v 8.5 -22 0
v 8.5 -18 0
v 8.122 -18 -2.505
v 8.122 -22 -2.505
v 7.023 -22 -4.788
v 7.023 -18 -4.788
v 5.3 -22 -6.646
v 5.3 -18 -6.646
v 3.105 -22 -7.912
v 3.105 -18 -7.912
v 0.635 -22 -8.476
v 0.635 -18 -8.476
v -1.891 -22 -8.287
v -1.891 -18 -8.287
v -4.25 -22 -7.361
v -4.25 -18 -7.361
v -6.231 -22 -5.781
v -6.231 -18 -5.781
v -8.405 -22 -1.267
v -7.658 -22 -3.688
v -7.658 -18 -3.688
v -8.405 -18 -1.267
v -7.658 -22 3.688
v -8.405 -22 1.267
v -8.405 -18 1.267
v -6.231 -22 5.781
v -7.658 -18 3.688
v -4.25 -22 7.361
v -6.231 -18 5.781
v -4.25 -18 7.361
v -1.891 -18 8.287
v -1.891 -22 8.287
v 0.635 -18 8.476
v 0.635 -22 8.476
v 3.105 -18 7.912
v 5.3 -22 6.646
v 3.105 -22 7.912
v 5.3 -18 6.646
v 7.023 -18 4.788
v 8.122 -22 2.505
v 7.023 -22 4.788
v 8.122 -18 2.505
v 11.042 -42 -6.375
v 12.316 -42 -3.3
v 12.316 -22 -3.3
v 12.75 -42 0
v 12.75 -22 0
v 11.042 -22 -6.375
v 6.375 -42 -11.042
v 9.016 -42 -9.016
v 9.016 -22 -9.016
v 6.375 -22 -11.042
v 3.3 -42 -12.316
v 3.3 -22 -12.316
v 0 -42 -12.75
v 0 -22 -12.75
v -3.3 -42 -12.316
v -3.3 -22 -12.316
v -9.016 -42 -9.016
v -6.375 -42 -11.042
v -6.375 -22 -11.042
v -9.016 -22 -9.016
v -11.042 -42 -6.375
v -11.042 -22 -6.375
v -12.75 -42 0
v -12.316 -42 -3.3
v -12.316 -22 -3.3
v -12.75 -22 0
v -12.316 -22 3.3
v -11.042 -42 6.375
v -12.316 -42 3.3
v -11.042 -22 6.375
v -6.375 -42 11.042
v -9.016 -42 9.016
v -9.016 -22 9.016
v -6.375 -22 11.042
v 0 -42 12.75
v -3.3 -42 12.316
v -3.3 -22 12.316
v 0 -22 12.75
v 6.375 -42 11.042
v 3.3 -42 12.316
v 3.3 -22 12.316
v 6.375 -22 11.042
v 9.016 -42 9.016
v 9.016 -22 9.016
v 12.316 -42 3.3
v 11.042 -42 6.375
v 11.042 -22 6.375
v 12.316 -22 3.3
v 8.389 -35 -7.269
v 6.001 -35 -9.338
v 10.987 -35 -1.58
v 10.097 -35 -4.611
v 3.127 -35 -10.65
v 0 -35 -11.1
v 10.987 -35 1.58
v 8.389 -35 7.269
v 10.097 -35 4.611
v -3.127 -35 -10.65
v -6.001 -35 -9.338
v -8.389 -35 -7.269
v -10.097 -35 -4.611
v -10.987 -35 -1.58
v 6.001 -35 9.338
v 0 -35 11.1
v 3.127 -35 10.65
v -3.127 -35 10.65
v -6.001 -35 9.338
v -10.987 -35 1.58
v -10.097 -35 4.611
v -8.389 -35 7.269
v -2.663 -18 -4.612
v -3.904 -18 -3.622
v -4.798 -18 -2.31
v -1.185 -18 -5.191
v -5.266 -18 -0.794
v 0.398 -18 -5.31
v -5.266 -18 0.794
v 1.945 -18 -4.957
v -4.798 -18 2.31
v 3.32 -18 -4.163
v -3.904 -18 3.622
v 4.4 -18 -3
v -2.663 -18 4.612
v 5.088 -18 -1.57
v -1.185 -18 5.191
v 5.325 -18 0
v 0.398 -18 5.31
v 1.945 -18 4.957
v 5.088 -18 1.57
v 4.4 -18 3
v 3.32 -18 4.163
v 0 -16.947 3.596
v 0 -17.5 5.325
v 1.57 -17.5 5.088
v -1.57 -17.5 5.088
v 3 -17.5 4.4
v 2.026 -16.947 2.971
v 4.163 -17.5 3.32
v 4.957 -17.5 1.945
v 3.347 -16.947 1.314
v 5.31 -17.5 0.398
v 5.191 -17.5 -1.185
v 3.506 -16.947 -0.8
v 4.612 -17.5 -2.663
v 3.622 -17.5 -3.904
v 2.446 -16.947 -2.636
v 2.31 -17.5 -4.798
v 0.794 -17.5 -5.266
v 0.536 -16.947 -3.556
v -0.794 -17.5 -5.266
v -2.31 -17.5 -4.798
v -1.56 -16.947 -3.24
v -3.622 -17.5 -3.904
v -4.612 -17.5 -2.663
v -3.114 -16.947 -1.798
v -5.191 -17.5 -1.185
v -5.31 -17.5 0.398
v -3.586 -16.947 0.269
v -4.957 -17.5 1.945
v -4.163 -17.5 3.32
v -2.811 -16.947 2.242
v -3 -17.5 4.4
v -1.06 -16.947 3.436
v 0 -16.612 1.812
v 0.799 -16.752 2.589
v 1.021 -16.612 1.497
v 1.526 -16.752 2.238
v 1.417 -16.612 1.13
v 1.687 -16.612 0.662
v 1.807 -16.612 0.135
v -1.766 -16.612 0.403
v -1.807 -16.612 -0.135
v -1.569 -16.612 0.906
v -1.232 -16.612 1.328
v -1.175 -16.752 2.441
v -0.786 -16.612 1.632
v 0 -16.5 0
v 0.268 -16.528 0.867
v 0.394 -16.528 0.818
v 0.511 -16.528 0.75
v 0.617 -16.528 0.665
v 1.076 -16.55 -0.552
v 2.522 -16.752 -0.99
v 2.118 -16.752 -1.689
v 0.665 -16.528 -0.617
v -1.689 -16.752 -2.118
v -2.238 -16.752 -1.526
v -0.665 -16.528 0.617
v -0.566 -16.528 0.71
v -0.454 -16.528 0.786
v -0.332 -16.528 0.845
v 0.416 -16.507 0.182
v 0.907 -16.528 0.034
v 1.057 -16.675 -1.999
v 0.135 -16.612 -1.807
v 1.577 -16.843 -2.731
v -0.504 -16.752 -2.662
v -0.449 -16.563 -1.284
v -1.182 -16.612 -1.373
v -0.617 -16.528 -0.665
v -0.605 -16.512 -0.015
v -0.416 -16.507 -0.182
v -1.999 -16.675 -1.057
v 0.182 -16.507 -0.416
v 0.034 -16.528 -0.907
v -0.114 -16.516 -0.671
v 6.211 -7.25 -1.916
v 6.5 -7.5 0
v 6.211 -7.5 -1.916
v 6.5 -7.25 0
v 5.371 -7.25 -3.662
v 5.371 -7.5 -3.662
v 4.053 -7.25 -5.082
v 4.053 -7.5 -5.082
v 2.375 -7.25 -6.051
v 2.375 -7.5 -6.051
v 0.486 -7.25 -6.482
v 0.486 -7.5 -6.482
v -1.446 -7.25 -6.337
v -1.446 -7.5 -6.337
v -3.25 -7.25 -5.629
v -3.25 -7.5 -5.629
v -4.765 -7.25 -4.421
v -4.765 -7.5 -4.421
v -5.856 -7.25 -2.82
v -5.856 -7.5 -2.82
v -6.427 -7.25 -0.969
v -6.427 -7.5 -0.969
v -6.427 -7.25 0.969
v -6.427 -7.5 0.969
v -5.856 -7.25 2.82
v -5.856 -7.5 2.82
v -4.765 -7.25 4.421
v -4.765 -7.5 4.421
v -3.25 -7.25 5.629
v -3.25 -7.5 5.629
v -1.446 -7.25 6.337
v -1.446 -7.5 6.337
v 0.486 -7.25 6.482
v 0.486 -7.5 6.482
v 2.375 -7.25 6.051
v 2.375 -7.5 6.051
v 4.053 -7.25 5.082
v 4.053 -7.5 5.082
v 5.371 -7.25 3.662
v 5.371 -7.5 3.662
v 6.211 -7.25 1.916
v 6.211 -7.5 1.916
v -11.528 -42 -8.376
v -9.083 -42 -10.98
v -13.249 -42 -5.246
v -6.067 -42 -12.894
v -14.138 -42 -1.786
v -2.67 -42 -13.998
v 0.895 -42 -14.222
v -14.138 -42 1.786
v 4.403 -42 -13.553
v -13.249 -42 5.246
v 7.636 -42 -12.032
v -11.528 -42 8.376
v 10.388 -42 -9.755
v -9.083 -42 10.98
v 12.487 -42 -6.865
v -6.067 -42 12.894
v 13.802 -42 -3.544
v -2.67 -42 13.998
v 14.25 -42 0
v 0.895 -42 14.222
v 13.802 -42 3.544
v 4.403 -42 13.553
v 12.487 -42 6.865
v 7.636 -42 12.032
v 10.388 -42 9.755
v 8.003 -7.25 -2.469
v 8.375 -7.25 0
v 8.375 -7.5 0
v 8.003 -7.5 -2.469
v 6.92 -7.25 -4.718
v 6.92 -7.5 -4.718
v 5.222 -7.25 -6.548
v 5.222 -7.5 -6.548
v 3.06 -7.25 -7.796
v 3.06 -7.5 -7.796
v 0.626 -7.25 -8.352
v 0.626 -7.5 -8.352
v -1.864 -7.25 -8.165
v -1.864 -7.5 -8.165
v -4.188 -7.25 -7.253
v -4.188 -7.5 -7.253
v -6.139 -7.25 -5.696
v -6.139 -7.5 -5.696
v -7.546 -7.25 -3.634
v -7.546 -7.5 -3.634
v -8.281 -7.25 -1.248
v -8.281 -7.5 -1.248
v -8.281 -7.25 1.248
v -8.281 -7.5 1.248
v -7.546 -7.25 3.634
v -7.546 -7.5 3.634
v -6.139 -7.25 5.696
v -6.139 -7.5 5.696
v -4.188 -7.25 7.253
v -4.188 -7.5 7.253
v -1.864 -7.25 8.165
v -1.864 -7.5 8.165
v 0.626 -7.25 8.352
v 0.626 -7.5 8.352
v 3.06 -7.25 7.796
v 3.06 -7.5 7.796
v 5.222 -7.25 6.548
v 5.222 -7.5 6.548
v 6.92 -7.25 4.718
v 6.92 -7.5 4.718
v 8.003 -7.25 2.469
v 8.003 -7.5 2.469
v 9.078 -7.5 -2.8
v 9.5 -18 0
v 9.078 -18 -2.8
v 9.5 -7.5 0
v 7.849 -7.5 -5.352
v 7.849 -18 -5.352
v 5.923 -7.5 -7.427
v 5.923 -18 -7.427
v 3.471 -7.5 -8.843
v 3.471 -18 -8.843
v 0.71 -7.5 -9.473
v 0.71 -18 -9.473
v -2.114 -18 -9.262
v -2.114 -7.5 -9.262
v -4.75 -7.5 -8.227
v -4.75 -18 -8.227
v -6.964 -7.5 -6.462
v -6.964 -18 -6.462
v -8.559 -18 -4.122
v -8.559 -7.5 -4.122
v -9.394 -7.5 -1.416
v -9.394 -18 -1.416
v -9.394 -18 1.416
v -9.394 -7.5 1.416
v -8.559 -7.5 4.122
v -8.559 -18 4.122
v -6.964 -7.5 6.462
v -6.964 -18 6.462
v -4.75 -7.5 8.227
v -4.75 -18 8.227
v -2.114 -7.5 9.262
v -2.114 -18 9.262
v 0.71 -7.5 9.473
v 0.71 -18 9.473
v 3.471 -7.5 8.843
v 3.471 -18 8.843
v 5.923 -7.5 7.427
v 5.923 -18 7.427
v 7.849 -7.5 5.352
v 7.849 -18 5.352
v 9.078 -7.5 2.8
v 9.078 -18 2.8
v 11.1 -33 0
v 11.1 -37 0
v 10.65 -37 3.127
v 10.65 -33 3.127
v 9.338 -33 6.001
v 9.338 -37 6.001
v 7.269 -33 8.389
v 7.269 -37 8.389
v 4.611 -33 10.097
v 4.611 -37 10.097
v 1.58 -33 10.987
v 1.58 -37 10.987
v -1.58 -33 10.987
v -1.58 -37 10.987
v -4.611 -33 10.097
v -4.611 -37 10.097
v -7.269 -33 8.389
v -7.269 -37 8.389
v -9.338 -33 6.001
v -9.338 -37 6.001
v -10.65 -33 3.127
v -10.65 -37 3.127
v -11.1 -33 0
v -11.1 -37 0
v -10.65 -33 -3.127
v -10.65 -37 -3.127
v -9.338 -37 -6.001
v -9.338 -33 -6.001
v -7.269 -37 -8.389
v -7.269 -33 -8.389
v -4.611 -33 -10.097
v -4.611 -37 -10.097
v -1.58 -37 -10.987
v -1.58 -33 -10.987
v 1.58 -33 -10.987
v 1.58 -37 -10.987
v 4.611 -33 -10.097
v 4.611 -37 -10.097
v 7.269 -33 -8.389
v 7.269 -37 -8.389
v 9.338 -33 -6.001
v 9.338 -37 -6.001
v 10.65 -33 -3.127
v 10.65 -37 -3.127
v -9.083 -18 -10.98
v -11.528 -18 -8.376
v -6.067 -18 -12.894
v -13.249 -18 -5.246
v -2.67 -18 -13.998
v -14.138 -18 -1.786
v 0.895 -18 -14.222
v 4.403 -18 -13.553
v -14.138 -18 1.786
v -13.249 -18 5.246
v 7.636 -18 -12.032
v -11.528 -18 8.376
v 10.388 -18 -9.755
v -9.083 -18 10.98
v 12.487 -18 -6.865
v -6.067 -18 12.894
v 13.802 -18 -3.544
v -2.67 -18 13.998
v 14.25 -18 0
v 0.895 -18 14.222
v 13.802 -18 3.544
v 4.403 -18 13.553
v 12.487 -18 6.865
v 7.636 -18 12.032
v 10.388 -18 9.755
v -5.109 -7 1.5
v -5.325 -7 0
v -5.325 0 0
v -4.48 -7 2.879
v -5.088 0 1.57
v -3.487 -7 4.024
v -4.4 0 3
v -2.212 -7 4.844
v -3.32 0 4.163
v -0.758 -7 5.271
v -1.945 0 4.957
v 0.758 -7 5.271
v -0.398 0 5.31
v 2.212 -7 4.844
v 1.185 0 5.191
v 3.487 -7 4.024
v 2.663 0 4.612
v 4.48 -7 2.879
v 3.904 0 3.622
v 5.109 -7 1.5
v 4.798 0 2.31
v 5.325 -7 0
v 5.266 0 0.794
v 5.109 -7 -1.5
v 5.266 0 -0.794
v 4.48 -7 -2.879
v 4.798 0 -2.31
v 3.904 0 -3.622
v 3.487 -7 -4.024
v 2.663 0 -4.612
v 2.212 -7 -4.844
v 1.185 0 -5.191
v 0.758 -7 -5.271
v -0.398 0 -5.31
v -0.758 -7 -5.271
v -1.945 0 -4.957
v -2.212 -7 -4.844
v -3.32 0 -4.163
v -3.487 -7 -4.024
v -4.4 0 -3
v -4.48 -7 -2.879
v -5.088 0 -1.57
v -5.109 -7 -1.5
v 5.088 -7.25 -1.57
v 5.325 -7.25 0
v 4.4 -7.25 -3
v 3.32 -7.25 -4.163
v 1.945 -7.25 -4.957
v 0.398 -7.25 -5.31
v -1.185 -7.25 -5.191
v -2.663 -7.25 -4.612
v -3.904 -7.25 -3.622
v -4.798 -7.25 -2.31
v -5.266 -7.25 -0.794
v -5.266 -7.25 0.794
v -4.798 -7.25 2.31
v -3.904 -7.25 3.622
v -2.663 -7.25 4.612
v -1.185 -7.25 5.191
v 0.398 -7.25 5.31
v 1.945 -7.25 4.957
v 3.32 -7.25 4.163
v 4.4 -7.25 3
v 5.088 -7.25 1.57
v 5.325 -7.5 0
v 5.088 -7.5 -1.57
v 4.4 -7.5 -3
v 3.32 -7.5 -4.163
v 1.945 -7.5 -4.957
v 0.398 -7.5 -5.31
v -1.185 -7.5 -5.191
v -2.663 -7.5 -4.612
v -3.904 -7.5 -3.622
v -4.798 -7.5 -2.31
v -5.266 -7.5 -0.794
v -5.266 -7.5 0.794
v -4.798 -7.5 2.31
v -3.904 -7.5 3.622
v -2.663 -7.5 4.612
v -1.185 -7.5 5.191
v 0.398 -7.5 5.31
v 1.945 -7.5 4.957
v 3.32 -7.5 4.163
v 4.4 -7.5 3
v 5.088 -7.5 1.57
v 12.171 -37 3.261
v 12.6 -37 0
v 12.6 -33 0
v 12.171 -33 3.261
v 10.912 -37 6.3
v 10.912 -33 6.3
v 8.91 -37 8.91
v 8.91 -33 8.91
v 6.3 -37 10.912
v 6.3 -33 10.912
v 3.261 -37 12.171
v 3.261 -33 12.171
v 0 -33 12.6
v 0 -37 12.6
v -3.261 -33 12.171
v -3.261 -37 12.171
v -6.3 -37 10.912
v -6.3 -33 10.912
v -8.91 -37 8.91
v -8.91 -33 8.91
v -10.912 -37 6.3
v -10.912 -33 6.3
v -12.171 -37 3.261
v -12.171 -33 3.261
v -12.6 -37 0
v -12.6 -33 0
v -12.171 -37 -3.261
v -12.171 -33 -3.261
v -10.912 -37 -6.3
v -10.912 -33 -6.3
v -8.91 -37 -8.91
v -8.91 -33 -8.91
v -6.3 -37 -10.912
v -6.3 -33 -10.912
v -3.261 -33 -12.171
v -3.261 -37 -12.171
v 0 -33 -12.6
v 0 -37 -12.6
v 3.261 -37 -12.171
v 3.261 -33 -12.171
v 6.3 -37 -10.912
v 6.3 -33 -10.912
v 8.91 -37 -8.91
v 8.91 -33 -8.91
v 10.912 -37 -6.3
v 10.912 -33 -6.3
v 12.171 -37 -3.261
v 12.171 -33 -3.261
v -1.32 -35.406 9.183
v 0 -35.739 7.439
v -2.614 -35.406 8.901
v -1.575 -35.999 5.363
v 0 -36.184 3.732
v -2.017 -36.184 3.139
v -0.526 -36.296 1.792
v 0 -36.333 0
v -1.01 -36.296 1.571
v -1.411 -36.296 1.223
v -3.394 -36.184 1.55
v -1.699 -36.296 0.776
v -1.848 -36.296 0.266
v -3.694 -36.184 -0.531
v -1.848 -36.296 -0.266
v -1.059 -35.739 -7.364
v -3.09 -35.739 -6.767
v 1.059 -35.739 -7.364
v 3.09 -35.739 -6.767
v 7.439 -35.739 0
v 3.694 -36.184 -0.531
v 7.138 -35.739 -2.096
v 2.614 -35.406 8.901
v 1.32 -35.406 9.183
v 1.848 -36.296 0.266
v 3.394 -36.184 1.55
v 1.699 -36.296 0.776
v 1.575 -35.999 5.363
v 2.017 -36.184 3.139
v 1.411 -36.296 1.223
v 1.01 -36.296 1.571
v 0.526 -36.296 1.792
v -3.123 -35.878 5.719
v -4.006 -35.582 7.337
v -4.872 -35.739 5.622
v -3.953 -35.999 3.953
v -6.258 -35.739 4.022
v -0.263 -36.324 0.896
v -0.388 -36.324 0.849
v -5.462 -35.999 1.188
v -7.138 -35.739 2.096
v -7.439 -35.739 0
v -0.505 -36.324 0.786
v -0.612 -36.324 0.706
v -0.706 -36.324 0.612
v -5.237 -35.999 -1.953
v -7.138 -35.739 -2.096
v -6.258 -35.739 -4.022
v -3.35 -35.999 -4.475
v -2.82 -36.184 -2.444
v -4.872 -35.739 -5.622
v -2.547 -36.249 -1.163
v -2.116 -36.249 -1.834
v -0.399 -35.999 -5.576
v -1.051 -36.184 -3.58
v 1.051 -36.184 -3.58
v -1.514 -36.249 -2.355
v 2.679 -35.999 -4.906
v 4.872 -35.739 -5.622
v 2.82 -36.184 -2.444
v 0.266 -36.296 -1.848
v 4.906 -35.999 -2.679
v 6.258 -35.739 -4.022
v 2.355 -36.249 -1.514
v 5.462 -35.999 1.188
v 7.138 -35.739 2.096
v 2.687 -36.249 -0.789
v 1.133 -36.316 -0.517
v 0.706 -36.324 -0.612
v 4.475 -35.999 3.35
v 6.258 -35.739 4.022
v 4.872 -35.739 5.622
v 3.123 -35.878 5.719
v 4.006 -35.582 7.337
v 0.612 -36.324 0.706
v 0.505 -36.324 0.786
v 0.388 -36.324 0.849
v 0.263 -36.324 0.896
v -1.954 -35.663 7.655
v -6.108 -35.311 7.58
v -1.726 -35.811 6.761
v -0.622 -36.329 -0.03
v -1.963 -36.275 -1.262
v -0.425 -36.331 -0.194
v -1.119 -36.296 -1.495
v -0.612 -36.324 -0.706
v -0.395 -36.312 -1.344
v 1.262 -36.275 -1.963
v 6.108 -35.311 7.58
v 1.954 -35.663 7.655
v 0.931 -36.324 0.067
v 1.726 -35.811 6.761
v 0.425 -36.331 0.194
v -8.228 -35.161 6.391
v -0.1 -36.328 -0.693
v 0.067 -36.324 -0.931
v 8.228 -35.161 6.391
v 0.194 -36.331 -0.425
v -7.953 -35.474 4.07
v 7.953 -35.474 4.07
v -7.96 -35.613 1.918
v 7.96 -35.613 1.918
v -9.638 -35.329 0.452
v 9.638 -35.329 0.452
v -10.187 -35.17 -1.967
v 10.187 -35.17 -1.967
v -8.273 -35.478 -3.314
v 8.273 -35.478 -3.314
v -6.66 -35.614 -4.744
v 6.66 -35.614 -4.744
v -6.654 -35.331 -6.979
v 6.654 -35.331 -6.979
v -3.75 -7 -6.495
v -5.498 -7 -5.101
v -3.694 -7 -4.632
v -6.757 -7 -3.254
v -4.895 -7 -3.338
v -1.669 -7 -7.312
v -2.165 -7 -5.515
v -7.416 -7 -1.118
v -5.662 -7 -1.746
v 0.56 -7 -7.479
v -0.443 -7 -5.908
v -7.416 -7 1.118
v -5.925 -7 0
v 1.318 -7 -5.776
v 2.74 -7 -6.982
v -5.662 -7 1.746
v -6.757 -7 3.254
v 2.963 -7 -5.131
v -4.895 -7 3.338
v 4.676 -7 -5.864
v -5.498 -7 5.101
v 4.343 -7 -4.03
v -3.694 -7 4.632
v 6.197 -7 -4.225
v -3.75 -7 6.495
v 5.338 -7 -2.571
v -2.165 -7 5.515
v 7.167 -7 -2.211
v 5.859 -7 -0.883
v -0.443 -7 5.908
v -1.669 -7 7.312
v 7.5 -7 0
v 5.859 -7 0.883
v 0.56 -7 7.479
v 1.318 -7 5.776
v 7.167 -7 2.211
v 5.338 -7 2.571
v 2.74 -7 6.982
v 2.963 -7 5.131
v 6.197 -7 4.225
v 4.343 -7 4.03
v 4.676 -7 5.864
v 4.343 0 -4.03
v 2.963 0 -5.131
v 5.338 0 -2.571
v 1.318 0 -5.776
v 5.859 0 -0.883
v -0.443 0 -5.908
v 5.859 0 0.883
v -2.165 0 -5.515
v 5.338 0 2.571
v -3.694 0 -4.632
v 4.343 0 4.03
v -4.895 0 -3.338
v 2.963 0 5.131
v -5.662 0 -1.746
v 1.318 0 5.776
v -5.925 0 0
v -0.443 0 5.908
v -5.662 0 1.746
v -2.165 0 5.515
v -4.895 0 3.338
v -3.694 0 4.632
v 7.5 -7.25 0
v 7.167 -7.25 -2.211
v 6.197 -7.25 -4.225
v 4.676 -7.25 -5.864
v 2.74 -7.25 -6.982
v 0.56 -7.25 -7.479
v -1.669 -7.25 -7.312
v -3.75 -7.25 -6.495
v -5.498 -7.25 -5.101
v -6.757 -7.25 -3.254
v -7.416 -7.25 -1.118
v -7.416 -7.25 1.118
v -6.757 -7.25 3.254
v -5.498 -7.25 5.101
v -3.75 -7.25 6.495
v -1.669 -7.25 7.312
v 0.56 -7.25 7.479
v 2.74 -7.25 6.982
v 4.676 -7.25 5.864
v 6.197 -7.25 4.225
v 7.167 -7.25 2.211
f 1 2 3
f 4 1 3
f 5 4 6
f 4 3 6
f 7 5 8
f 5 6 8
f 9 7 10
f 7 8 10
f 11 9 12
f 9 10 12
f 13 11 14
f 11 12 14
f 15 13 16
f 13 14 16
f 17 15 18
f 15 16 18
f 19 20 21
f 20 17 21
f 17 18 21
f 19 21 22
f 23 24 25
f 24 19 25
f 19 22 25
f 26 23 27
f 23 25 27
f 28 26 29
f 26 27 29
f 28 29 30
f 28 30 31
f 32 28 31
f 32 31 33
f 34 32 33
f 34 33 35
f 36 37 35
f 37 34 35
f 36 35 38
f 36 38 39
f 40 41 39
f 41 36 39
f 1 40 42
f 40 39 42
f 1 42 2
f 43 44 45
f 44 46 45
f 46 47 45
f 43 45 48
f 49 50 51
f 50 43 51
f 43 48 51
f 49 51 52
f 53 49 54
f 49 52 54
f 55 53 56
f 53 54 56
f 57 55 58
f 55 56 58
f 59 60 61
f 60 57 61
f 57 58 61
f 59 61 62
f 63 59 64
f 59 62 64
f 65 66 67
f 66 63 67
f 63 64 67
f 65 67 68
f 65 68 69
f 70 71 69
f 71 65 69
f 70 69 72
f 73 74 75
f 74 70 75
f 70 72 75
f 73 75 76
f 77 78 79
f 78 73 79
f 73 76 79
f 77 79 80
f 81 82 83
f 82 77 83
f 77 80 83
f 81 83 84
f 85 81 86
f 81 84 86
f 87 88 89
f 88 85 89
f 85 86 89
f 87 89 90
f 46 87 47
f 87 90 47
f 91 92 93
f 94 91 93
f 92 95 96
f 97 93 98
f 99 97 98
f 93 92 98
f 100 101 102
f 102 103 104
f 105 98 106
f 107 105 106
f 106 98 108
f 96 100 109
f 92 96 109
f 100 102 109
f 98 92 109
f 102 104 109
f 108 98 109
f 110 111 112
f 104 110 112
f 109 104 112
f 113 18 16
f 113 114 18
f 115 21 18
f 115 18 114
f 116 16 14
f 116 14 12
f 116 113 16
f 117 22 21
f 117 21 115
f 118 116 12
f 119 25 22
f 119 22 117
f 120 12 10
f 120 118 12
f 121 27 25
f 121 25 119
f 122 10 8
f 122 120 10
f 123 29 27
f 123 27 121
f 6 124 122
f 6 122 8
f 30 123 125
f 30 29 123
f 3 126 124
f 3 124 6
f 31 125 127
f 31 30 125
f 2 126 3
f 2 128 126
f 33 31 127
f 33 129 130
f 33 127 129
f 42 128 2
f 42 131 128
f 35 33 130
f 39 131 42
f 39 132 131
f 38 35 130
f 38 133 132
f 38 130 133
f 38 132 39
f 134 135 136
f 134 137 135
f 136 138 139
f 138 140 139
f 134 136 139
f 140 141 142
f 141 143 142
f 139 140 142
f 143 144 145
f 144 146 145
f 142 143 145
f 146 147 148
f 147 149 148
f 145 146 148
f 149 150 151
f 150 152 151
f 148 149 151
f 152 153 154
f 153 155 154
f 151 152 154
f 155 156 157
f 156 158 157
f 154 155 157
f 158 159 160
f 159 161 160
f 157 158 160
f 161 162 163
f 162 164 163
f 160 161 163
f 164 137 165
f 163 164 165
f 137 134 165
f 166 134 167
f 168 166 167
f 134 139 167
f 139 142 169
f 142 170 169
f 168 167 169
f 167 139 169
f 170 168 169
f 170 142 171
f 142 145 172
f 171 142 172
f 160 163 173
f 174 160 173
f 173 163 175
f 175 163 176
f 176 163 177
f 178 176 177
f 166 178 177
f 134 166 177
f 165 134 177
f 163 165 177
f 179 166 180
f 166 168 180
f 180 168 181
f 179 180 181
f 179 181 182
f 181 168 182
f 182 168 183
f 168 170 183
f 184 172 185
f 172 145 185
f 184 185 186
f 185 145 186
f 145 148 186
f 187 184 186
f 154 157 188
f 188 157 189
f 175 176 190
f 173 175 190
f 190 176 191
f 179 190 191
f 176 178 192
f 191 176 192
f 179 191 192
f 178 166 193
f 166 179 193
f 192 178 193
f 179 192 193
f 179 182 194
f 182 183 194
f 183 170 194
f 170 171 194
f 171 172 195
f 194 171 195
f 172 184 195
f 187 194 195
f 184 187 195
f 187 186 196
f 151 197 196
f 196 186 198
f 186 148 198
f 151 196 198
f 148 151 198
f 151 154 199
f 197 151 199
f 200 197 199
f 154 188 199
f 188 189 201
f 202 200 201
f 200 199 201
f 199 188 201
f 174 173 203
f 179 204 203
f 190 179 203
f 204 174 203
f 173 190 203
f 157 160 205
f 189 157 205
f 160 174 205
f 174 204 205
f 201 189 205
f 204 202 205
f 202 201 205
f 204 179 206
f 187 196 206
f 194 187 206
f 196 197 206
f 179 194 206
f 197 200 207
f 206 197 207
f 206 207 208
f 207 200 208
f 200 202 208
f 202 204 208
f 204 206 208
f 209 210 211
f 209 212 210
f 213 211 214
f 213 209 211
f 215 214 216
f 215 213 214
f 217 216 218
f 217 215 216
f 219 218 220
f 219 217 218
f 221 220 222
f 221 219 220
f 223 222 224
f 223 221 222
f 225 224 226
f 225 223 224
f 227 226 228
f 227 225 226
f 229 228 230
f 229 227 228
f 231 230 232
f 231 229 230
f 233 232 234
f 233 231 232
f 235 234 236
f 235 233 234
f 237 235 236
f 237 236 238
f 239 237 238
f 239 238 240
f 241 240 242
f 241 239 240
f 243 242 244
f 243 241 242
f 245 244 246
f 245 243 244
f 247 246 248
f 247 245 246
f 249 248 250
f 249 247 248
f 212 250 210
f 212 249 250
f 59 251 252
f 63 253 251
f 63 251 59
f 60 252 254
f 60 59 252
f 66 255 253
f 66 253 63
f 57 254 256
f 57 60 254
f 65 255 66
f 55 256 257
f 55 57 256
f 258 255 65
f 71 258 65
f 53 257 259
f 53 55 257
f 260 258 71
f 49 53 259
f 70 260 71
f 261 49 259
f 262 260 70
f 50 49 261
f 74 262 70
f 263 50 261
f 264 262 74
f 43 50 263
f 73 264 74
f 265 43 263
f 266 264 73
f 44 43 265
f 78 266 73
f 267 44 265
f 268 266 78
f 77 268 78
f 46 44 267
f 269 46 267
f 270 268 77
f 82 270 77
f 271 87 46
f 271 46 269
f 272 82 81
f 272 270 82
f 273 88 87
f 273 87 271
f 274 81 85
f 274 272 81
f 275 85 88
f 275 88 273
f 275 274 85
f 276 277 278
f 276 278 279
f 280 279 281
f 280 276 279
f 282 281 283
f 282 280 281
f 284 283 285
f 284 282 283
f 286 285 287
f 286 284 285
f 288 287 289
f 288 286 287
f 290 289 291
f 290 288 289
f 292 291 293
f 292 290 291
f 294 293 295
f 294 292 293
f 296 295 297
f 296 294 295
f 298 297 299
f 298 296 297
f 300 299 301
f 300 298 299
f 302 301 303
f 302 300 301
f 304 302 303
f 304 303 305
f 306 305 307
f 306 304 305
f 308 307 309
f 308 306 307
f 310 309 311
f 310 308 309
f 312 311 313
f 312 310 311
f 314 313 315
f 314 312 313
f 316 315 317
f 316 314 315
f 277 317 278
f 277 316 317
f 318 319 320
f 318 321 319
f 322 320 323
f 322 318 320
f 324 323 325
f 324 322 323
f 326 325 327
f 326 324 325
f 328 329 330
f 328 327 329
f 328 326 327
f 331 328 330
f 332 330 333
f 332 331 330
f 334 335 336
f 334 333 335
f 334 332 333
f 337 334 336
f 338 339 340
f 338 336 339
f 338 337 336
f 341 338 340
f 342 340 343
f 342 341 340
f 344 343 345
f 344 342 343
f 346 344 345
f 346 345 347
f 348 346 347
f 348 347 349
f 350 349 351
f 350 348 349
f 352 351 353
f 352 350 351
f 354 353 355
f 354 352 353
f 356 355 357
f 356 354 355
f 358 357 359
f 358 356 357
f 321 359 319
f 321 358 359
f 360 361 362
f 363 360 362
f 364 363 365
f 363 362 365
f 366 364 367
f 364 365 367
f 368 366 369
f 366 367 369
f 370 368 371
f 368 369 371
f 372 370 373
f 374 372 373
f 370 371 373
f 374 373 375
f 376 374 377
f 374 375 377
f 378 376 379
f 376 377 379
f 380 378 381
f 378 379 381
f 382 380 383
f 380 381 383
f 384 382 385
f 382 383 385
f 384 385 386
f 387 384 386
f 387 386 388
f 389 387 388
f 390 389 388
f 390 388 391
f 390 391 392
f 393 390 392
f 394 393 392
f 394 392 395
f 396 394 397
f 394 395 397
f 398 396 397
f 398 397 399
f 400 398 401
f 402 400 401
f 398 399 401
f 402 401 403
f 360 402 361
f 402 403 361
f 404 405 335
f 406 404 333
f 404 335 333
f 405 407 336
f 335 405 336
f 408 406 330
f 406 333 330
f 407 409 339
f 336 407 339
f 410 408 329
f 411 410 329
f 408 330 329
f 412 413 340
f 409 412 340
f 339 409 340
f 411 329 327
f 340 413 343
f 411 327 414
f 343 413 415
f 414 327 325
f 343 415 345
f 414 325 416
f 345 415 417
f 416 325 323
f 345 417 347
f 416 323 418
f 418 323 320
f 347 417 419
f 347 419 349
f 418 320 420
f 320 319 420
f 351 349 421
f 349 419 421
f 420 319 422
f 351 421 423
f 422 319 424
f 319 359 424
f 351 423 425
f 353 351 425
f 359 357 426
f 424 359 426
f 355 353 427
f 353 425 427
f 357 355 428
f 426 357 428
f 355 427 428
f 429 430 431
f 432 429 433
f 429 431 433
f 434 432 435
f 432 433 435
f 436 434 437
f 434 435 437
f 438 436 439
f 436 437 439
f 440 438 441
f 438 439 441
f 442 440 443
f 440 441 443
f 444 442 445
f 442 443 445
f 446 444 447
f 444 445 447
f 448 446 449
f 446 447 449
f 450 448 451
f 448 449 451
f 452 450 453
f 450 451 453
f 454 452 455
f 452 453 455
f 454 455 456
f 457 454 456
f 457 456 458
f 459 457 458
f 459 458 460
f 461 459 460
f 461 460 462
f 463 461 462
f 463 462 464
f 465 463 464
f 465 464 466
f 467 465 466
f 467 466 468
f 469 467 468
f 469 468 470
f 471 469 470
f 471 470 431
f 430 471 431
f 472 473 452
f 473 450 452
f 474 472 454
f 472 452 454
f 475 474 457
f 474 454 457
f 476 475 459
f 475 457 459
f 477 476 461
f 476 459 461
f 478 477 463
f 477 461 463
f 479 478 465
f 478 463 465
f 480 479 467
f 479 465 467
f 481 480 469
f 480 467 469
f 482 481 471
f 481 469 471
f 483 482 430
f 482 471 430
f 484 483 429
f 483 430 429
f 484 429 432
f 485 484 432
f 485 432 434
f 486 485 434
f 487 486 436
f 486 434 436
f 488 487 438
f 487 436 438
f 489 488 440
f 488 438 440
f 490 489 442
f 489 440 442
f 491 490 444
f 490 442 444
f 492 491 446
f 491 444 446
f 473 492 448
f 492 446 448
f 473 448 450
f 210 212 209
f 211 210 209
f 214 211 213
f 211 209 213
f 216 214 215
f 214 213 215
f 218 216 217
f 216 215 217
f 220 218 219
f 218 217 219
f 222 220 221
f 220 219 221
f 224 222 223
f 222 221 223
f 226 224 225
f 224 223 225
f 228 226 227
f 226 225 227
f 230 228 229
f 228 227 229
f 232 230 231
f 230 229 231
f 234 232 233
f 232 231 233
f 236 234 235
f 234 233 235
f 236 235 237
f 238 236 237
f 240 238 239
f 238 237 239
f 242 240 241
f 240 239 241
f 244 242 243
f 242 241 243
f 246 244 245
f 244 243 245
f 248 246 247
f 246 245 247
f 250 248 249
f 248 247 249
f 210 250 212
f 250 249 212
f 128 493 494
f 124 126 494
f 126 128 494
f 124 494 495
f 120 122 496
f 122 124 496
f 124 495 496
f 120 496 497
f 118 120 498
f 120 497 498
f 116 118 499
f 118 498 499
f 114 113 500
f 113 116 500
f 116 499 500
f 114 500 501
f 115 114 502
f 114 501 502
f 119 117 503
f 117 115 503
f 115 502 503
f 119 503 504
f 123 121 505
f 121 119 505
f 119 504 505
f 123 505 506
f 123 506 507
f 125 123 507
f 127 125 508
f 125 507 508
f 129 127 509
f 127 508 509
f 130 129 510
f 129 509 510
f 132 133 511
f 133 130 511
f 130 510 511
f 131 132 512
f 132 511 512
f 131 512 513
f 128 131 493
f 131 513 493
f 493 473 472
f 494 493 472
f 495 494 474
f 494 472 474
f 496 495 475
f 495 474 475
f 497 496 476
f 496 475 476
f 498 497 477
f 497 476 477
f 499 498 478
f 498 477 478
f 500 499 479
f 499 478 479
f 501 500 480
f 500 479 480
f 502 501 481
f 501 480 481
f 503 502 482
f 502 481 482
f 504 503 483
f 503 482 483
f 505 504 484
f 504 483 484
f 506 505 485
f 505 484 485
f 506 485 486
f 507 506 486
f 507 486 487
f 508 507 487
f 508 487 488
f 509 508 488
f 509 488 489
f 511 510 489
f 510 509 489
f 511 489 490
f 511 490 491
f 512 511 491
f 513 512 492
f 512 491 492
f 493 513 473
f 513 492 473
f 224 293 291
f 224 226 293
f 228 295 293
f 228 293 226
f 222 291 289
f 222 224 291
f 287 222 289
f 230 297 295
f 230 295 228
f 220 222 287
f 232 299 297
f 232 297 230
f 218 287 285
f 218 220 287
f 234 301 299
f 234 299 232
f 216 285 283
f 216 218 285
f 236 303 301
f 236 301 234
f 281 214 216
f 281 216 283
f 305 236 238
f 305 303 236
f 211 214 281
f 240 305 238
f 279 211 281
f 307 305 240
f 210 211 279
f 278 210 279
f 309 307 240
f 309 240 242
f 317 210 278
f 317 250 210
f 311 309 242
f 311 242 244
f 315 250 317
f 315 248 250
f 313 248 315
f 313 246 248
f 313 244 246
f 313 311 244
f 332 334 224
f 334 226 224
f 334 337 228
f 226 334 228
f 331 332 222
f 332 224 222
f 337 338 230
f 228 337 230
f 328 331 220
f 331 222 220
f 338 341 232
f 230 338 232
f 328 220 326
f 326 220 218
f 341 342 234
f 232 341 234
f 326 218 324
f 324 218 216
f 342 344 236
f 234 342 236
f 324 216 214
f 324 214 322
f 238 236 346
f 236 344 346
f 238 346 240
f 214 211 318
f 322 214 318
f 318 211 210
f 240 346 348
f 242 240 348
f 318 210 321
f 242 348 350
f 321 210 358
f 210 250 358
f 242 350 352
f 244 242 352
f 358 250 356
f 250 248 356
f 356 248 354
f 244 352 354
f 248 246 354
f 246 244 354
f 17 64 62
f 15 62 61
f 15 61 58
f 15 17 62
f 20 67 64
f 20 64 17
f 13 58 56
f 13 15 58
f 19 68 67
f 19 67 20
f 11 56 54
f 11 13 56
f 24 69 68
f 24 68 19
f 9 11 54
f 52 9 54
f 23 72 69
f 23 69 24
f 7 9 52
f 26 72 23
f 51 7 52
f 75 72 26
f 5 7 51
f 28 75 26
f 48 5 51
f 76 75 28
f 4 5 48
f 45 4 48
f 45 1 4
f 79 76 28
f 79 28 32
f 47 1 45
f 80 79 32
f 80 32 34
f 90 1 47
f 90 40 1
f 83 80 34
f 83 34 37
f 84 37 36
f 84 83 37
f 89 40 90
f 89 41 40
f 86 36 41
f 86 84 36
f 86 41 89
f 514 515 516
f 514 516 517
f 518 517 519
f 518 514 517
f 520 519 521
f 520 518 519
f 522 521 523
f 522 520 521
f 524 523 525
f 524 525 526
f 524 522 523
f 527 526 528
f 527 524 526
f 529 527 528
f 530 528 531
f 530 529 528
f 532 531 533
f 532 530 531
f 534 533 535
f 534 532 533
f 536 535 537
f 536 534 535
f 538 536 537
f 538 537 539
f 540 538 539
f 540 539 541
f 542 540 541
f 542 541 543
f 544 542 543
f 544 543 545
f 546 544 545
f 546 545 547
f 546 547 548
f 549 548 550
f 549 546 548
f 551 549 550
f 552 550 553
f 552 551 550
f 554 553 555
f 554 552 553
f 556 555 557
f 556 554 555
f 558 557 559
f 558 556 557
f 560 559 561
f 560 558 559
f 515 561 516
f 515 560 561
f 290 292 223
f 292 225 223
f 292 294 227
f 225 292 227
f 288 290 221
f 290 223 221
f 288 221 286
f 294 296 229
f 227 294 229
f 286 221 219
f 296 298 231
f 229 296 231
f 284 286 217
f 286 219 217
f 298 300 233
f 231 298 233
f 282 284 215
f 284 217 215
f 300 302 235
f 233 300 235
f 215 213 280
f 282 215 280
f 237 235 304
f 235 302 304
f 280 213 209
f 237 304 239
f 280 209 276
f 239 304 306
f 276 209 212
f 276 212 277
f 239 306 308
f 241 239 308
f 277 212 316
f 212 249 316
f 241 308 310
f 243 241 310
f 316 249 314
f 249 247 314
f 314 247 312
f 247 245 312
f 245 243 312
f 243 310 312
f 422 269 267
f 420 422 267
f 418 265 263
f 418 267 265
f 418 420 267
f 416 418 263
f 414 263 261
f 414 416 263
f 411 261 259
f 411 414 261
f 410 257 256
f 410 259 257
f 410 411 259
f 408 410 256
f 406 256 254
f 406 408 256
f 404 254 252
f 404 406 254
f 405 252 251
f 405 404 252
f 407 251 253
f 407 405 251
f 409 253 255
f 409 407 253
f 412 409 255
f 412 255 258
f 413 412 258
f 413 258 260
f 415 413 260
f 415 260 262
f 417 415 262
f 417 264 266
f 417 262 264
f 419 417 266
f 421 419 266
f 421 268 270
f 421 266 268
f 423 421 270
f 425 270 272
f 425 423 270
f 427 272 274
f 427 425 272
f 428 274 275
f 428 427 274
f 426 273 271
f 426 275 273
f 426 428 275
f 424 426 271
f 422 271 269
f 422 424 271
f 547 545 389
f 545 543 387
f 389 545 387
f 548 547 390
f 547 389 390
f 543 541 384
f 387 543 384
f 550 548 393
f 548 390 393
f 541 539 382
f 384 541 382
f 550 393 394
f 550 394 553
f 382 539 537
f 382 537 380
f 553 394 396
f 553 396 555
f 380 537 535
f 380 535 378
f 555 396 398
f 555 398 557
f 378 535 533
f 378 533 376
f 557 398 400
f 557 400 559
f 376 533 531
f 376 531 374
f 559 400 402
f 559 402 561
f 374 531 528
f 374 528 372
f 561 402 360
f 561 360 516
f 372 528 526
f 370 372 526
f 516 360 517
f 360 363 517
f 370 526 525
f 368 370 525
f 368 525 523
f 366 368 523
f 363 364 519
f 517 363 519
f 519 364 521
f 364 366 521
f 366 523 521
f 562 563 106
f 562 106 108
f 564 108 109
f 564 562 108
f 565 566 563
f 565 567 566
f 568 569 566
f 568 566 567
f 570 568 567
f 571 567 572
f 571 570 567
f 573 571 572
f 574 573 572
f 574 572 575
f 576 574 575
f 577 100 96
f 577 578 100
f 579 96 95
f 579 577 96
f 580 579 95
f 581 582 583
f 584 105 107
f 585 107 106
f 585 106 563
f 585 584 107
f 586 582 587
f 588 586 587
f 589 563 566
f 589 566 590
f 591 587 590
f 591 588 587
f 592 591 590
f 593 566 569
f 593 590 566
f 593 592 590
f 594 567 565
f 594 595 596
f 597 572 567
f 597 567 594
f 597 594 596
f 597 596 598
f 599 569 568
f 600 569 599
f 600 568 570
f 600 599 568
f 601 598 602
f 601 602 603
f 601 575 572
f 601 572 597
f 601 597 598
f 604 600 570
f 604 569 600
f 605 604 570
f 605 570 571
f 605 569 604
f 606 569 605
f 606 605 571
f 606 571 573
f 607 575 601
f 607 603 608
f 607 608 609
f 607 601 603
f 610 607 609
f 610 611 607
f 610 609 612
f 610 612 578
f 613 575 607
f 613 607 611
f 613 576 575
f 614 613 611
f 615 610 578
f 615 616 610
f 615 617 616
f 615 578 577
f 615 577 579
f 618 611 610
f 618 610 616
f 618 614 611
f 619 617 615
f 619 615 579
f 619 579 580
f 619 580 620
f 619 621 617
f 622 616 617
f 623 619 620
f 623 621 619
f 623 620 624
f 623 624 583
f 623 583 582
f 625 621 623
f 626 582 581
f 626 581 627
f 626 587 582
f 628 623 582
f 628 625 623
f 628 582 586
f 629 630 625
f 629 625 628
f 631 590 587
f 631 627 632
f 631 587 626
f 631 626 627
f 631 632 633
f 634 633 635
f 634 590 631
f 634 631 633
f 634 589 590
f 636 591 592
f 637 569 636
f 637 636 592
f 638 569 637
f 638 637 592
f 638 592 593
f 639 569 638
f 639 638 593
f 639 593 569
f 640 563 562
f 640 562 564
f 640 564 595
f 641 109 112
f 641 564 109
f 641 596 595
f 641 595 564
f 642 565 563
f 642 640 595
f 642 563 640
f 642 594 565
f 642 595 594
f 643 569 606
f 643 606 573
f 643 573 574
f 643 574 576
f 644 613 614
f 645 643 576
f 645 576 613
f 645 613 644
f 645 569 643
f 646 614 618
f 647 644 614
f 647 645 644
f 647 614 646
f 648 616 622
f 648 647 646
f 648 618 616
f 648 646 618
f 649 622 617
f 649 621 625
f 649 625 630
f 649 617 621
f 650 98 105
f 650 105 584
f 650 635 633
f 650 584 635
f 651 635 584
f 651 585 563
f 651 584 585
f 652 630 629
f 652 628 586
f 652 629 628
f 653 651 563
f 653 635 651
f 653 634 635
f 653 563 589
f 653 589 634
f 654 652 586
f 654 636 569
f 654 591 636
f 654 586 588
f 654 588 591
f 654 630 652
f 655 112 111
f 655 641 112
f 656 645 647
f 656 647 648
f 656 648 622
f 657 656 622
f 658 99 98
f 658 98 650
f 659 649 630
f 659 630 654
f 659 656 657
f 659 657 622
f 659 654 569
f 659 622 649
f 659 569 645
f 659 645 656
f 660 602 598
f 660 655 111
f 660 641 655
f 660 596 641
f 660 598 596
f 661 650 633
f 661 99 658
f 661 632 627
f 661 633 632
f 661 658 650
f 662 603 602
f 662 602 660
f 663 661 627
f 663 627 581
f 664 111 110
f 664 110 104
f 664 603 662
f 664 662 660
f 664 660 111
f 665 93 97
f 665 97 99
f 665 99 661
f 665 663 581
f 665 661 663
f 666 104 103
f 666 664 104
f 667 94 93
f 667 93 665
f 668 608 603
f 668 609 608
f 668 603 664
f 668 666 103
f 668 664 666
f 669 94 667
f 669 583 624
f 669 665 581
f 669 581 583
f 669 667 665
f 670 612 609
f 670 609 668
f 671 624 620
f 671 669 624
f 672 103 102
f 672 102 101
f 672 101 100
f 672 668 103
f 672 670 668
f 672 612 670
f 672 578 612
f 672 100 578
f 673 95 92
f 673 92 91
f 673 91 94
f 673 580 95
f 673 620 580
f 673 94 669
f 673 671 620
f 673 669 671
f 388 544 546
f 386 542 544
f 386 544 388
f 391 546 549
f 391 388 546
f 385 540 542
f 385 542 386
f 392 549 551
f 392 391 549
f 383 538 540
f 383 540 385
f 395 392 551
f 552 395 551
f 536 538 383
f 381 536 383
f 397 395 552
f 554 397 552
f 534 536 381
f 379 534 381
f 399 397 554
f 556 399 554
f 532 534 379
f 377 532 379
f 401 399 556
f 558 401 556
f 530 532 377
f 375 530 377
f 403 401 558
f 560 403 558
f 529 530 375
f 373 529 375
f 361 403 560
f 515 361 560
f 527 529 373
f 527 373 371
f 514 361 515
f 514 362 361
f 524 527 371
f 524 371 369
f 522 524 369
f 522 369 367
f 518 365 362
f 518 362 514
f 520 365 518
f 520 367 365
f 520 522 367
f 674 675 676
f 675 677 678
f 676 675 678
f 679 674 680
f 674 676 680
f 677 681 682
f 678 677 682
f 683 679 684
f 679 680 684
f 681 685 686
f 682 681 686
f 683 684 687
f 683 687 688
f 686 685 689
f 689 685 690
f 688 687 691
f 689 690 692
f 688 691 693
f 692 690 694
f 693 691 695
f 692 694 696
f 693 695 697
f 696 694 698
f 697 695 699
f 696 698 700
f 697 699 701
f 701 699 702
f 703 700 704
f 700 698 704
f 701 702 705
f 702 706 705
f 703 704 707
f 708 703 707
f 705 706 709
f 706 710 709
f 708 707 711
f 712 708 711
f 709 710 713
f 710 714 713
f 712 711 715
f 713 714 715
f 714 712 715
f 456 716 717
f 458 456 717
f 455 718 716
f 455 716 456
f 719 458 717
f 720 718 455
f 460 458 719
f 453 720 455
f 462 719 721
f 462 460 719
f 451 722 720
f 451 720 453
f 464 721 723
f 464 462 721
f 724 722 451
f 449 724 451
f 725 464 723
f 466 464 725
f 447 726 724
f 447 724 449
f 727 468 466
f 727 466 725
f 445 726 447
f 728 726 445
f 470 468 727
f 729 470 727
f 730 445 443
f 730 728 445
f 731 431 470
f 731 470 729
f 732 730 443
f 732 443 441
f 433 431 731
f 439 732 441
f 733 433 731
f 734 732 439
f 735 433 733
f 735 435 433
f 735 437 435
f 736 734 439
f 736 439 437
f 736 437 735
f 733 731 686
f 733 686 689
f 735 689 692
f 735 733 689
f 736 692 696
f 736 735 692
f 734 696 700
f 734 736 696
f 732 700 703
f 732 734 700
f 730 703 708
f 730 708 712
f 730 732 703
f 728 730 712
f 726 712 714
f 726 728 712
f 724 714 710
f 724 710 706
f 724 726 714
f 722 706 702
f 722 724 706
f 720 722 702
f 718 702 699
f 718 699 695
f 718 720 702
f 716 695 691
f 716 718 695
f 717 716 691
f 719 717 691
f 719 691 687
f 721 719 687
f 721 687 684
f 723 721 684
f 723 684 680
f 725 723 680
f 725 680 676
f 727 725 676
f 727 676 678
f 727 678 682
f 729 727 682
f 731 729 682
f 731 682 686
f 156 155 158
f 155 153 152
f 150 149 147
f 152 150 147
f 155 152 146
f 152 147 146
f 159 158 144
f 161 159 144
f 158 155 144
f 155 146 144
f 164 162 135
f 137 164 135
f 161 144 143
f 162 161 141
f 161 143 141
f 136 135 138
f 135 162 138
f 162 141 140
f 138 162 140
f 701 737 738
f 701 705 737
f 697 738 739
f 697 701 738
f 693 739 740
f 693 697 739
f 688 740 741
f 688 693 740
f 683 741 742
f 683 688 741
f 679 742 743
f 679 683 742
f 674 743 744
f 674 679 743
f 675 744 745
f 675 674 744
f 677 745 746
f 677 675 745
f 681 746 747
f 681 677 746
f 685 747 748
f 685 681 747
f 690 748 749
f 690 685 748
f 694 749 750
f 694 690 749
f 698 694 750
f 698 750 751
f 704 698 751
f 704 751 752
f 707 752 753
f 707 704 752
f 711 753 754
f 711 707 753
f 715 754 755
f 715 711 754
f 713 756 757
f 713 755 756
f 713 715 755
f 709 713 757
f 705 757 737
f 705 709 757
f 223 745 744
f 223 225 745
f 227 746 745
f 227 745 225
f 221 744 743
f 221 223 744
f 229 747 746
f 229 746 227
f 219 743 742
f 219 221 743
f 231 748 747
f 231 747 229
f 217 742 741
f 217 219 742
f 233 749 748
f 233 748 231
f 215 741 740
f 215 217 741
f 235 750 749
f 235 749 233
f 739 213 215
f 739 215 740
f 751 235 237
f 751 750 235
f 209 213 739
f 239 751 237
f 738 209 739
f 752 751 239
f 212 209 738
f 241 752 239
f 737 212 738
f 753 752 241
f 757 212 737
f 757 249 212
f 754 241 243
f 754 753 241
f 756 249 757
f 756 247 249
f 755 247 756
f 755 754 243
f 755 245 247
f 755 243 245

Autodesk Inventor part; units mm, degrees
sketch "Sketch1" plane through (0, 0, 0) normal (0, 1, 0) x (-1, 0, 0)
  circle A0 centre (0, 0) radius 5.925
  circle A1 centre (0, 0) radius 5.325
  dimension "d0" = 11.85
  dimension "d1" = 0.6
extrude "Extrusion1" add sketch "Sketch1" against normal blind 7
thread "Thread1" size "M12x0.5" class "6g" standard "ANSI Metric M Profile" length 6 offset 1
sketch "Sketch2" plane through (0, -7, 0) normal (0, -1, 0) x (1, 0, 0)
  circle A0 centre (0, 0) radius 7.5
  circle A1 centre (0, 0) radius 5.325 projected
  dimension "d6" = 15
extrude "Extrusion2" add sketch "Sketch2" along normal blind 0.25
sketch "Sketch3" plane through (0, -7.25, 0) normal (0, -1, 0) x (1, 0, 0)
  circle A0 centre (0, 0) radius 8.375
  circle A1 centre (0, 0) radius 6.5
  dimension "d9" = 16.75
  dimension "d10" = 13
extrude "Extrusion3" add sketch "Sketch3" along normal blind 0.25 separate body
sketch "Sketch4" plane through (0, -7.25, 0) normal (0, -1, 0) x (1, 0, 0)
  circle A0 centre (0, 0) radius 5.325 projected
  circle A1 centre (0, 0) radius 6.5 projected
extrude "Extrusion4" add sketch "Sketch4" along normal blind 0.25 bodies 1
sketch "Sketch5" plane through (0, -7.5, 0) normal (0, -1, 0) x (1, 0, 0)
  circle A0 centre (0, 0) radius 5.325 projected
  circle A1 centre (0, 0) radius 9.5
  dimension "d15" = 19
extrude "Extrusion5" add sketch "Sketch5" along normal blind 10.5 bodies 1
sketch "Sketch6" plane through (0, -18, 0) normal (0, -1, 0) x (1, 0, 0)
  circle A0 centre (0, 0) radius 14.25
  circle A1 centre (0, 0) radius 9.5 construction
  circle A2 centre (0, 0) radius 8.5
  dimension "d18" = 28.5
  dimension "d19" = 1
extrude "Extrusion6" add sketch "Sketch6" along normal blind 4 bodies 1
sketch "Sketch7" plane through (0, -22, 0) normal (0, -1, 0) x (1, 0, 0)
  circle A0 centre (0, 0) radius 14.25 projected
  circle A1 centre (0, 0) radius 12.75
  dimension "d22" = 1.5
extrude "Extrusion7" add sketch "Sketch7" along normal blind 20 bodies 1
ref_plane "Large Optic" through (0, -37, 0) normal (0, -1, 0) x (1, 0, 0)
sketch "Sketch8" plane through (0, -37, 0) normal (0, -1, 0) x (1, 0, 0)
  circle A0 centre (0, 0) radius 12.75 construction
  circle A1 centre (0, 0) radius 12.6
  circle A2 centre (0, 0) radius 11.1
  dimension "d26" = 0.15
  dimension "d27" = 1.5
extrude "Extrusion8" add sketch "Sketch8" against normal blind 4 separate body
ref_plane "Large Optic Lens" through (0, -35, 0) normal (0, -1, 0) x (1, 0, 0)
sketch "Sketch9" plane through (0, -35, 0) normal (0, -1, 0) x (1, 0, 0)
  circle A0 centre (0, 0) radius 11.1 projected
sketch "Sketch10" plane through (0, 0, 0) normal (1, 0, 0) x (0, 1, 0)
  line L0 (-35, 11.1) -> (-35, -11.1) construction
  line L1 (-35, 0) -> (-36.333, 0)
  arc A0 (-35, 11.1) -> (-36.333, 0) centre (10.5488, 0) ccw
  line L2 (-35, 11.1) -> (-35, 0)
  point P0 (0, 0)
  dimension "d30" = 1.333
revolve "Revolution1" add sketch "Sketch10" angle 360 about axis through (0, -35, 0) along (0, -1, 0) separate body
ref_plane "Small Optic Lens" through (0, -17.5, 0) normal (0, -1, 0) x (1, 0, 0)
sketch "Sketch12" plane through (0, 0, 0) normal (1, 0, 0) x (0, 1, 0)
  line L0 (-17.5, -19.95) -> (-17.5, 19.95) construction
  line L1 (-17.5, 0) -> (-16.5, 0)
  arc A0 (-16.5, 0) -> (-17.5, 5.325) centre (-31.1778, 0) ccw
  line L2 (0, 5.325) -> (-18, 5.325) construction
  line L3 (-17.5, 0) -> (-17.5, 5.325)
  point P0 (0, 0)
  dimension "d33" = 1
revolve "Revolution2" add sketch "Sketch12" angle 360 about axis through (0, -17.5, 0) along (0, 1, 0) bodies 4
properties part number "M12 2.8-12mm F1.4 Lens"
